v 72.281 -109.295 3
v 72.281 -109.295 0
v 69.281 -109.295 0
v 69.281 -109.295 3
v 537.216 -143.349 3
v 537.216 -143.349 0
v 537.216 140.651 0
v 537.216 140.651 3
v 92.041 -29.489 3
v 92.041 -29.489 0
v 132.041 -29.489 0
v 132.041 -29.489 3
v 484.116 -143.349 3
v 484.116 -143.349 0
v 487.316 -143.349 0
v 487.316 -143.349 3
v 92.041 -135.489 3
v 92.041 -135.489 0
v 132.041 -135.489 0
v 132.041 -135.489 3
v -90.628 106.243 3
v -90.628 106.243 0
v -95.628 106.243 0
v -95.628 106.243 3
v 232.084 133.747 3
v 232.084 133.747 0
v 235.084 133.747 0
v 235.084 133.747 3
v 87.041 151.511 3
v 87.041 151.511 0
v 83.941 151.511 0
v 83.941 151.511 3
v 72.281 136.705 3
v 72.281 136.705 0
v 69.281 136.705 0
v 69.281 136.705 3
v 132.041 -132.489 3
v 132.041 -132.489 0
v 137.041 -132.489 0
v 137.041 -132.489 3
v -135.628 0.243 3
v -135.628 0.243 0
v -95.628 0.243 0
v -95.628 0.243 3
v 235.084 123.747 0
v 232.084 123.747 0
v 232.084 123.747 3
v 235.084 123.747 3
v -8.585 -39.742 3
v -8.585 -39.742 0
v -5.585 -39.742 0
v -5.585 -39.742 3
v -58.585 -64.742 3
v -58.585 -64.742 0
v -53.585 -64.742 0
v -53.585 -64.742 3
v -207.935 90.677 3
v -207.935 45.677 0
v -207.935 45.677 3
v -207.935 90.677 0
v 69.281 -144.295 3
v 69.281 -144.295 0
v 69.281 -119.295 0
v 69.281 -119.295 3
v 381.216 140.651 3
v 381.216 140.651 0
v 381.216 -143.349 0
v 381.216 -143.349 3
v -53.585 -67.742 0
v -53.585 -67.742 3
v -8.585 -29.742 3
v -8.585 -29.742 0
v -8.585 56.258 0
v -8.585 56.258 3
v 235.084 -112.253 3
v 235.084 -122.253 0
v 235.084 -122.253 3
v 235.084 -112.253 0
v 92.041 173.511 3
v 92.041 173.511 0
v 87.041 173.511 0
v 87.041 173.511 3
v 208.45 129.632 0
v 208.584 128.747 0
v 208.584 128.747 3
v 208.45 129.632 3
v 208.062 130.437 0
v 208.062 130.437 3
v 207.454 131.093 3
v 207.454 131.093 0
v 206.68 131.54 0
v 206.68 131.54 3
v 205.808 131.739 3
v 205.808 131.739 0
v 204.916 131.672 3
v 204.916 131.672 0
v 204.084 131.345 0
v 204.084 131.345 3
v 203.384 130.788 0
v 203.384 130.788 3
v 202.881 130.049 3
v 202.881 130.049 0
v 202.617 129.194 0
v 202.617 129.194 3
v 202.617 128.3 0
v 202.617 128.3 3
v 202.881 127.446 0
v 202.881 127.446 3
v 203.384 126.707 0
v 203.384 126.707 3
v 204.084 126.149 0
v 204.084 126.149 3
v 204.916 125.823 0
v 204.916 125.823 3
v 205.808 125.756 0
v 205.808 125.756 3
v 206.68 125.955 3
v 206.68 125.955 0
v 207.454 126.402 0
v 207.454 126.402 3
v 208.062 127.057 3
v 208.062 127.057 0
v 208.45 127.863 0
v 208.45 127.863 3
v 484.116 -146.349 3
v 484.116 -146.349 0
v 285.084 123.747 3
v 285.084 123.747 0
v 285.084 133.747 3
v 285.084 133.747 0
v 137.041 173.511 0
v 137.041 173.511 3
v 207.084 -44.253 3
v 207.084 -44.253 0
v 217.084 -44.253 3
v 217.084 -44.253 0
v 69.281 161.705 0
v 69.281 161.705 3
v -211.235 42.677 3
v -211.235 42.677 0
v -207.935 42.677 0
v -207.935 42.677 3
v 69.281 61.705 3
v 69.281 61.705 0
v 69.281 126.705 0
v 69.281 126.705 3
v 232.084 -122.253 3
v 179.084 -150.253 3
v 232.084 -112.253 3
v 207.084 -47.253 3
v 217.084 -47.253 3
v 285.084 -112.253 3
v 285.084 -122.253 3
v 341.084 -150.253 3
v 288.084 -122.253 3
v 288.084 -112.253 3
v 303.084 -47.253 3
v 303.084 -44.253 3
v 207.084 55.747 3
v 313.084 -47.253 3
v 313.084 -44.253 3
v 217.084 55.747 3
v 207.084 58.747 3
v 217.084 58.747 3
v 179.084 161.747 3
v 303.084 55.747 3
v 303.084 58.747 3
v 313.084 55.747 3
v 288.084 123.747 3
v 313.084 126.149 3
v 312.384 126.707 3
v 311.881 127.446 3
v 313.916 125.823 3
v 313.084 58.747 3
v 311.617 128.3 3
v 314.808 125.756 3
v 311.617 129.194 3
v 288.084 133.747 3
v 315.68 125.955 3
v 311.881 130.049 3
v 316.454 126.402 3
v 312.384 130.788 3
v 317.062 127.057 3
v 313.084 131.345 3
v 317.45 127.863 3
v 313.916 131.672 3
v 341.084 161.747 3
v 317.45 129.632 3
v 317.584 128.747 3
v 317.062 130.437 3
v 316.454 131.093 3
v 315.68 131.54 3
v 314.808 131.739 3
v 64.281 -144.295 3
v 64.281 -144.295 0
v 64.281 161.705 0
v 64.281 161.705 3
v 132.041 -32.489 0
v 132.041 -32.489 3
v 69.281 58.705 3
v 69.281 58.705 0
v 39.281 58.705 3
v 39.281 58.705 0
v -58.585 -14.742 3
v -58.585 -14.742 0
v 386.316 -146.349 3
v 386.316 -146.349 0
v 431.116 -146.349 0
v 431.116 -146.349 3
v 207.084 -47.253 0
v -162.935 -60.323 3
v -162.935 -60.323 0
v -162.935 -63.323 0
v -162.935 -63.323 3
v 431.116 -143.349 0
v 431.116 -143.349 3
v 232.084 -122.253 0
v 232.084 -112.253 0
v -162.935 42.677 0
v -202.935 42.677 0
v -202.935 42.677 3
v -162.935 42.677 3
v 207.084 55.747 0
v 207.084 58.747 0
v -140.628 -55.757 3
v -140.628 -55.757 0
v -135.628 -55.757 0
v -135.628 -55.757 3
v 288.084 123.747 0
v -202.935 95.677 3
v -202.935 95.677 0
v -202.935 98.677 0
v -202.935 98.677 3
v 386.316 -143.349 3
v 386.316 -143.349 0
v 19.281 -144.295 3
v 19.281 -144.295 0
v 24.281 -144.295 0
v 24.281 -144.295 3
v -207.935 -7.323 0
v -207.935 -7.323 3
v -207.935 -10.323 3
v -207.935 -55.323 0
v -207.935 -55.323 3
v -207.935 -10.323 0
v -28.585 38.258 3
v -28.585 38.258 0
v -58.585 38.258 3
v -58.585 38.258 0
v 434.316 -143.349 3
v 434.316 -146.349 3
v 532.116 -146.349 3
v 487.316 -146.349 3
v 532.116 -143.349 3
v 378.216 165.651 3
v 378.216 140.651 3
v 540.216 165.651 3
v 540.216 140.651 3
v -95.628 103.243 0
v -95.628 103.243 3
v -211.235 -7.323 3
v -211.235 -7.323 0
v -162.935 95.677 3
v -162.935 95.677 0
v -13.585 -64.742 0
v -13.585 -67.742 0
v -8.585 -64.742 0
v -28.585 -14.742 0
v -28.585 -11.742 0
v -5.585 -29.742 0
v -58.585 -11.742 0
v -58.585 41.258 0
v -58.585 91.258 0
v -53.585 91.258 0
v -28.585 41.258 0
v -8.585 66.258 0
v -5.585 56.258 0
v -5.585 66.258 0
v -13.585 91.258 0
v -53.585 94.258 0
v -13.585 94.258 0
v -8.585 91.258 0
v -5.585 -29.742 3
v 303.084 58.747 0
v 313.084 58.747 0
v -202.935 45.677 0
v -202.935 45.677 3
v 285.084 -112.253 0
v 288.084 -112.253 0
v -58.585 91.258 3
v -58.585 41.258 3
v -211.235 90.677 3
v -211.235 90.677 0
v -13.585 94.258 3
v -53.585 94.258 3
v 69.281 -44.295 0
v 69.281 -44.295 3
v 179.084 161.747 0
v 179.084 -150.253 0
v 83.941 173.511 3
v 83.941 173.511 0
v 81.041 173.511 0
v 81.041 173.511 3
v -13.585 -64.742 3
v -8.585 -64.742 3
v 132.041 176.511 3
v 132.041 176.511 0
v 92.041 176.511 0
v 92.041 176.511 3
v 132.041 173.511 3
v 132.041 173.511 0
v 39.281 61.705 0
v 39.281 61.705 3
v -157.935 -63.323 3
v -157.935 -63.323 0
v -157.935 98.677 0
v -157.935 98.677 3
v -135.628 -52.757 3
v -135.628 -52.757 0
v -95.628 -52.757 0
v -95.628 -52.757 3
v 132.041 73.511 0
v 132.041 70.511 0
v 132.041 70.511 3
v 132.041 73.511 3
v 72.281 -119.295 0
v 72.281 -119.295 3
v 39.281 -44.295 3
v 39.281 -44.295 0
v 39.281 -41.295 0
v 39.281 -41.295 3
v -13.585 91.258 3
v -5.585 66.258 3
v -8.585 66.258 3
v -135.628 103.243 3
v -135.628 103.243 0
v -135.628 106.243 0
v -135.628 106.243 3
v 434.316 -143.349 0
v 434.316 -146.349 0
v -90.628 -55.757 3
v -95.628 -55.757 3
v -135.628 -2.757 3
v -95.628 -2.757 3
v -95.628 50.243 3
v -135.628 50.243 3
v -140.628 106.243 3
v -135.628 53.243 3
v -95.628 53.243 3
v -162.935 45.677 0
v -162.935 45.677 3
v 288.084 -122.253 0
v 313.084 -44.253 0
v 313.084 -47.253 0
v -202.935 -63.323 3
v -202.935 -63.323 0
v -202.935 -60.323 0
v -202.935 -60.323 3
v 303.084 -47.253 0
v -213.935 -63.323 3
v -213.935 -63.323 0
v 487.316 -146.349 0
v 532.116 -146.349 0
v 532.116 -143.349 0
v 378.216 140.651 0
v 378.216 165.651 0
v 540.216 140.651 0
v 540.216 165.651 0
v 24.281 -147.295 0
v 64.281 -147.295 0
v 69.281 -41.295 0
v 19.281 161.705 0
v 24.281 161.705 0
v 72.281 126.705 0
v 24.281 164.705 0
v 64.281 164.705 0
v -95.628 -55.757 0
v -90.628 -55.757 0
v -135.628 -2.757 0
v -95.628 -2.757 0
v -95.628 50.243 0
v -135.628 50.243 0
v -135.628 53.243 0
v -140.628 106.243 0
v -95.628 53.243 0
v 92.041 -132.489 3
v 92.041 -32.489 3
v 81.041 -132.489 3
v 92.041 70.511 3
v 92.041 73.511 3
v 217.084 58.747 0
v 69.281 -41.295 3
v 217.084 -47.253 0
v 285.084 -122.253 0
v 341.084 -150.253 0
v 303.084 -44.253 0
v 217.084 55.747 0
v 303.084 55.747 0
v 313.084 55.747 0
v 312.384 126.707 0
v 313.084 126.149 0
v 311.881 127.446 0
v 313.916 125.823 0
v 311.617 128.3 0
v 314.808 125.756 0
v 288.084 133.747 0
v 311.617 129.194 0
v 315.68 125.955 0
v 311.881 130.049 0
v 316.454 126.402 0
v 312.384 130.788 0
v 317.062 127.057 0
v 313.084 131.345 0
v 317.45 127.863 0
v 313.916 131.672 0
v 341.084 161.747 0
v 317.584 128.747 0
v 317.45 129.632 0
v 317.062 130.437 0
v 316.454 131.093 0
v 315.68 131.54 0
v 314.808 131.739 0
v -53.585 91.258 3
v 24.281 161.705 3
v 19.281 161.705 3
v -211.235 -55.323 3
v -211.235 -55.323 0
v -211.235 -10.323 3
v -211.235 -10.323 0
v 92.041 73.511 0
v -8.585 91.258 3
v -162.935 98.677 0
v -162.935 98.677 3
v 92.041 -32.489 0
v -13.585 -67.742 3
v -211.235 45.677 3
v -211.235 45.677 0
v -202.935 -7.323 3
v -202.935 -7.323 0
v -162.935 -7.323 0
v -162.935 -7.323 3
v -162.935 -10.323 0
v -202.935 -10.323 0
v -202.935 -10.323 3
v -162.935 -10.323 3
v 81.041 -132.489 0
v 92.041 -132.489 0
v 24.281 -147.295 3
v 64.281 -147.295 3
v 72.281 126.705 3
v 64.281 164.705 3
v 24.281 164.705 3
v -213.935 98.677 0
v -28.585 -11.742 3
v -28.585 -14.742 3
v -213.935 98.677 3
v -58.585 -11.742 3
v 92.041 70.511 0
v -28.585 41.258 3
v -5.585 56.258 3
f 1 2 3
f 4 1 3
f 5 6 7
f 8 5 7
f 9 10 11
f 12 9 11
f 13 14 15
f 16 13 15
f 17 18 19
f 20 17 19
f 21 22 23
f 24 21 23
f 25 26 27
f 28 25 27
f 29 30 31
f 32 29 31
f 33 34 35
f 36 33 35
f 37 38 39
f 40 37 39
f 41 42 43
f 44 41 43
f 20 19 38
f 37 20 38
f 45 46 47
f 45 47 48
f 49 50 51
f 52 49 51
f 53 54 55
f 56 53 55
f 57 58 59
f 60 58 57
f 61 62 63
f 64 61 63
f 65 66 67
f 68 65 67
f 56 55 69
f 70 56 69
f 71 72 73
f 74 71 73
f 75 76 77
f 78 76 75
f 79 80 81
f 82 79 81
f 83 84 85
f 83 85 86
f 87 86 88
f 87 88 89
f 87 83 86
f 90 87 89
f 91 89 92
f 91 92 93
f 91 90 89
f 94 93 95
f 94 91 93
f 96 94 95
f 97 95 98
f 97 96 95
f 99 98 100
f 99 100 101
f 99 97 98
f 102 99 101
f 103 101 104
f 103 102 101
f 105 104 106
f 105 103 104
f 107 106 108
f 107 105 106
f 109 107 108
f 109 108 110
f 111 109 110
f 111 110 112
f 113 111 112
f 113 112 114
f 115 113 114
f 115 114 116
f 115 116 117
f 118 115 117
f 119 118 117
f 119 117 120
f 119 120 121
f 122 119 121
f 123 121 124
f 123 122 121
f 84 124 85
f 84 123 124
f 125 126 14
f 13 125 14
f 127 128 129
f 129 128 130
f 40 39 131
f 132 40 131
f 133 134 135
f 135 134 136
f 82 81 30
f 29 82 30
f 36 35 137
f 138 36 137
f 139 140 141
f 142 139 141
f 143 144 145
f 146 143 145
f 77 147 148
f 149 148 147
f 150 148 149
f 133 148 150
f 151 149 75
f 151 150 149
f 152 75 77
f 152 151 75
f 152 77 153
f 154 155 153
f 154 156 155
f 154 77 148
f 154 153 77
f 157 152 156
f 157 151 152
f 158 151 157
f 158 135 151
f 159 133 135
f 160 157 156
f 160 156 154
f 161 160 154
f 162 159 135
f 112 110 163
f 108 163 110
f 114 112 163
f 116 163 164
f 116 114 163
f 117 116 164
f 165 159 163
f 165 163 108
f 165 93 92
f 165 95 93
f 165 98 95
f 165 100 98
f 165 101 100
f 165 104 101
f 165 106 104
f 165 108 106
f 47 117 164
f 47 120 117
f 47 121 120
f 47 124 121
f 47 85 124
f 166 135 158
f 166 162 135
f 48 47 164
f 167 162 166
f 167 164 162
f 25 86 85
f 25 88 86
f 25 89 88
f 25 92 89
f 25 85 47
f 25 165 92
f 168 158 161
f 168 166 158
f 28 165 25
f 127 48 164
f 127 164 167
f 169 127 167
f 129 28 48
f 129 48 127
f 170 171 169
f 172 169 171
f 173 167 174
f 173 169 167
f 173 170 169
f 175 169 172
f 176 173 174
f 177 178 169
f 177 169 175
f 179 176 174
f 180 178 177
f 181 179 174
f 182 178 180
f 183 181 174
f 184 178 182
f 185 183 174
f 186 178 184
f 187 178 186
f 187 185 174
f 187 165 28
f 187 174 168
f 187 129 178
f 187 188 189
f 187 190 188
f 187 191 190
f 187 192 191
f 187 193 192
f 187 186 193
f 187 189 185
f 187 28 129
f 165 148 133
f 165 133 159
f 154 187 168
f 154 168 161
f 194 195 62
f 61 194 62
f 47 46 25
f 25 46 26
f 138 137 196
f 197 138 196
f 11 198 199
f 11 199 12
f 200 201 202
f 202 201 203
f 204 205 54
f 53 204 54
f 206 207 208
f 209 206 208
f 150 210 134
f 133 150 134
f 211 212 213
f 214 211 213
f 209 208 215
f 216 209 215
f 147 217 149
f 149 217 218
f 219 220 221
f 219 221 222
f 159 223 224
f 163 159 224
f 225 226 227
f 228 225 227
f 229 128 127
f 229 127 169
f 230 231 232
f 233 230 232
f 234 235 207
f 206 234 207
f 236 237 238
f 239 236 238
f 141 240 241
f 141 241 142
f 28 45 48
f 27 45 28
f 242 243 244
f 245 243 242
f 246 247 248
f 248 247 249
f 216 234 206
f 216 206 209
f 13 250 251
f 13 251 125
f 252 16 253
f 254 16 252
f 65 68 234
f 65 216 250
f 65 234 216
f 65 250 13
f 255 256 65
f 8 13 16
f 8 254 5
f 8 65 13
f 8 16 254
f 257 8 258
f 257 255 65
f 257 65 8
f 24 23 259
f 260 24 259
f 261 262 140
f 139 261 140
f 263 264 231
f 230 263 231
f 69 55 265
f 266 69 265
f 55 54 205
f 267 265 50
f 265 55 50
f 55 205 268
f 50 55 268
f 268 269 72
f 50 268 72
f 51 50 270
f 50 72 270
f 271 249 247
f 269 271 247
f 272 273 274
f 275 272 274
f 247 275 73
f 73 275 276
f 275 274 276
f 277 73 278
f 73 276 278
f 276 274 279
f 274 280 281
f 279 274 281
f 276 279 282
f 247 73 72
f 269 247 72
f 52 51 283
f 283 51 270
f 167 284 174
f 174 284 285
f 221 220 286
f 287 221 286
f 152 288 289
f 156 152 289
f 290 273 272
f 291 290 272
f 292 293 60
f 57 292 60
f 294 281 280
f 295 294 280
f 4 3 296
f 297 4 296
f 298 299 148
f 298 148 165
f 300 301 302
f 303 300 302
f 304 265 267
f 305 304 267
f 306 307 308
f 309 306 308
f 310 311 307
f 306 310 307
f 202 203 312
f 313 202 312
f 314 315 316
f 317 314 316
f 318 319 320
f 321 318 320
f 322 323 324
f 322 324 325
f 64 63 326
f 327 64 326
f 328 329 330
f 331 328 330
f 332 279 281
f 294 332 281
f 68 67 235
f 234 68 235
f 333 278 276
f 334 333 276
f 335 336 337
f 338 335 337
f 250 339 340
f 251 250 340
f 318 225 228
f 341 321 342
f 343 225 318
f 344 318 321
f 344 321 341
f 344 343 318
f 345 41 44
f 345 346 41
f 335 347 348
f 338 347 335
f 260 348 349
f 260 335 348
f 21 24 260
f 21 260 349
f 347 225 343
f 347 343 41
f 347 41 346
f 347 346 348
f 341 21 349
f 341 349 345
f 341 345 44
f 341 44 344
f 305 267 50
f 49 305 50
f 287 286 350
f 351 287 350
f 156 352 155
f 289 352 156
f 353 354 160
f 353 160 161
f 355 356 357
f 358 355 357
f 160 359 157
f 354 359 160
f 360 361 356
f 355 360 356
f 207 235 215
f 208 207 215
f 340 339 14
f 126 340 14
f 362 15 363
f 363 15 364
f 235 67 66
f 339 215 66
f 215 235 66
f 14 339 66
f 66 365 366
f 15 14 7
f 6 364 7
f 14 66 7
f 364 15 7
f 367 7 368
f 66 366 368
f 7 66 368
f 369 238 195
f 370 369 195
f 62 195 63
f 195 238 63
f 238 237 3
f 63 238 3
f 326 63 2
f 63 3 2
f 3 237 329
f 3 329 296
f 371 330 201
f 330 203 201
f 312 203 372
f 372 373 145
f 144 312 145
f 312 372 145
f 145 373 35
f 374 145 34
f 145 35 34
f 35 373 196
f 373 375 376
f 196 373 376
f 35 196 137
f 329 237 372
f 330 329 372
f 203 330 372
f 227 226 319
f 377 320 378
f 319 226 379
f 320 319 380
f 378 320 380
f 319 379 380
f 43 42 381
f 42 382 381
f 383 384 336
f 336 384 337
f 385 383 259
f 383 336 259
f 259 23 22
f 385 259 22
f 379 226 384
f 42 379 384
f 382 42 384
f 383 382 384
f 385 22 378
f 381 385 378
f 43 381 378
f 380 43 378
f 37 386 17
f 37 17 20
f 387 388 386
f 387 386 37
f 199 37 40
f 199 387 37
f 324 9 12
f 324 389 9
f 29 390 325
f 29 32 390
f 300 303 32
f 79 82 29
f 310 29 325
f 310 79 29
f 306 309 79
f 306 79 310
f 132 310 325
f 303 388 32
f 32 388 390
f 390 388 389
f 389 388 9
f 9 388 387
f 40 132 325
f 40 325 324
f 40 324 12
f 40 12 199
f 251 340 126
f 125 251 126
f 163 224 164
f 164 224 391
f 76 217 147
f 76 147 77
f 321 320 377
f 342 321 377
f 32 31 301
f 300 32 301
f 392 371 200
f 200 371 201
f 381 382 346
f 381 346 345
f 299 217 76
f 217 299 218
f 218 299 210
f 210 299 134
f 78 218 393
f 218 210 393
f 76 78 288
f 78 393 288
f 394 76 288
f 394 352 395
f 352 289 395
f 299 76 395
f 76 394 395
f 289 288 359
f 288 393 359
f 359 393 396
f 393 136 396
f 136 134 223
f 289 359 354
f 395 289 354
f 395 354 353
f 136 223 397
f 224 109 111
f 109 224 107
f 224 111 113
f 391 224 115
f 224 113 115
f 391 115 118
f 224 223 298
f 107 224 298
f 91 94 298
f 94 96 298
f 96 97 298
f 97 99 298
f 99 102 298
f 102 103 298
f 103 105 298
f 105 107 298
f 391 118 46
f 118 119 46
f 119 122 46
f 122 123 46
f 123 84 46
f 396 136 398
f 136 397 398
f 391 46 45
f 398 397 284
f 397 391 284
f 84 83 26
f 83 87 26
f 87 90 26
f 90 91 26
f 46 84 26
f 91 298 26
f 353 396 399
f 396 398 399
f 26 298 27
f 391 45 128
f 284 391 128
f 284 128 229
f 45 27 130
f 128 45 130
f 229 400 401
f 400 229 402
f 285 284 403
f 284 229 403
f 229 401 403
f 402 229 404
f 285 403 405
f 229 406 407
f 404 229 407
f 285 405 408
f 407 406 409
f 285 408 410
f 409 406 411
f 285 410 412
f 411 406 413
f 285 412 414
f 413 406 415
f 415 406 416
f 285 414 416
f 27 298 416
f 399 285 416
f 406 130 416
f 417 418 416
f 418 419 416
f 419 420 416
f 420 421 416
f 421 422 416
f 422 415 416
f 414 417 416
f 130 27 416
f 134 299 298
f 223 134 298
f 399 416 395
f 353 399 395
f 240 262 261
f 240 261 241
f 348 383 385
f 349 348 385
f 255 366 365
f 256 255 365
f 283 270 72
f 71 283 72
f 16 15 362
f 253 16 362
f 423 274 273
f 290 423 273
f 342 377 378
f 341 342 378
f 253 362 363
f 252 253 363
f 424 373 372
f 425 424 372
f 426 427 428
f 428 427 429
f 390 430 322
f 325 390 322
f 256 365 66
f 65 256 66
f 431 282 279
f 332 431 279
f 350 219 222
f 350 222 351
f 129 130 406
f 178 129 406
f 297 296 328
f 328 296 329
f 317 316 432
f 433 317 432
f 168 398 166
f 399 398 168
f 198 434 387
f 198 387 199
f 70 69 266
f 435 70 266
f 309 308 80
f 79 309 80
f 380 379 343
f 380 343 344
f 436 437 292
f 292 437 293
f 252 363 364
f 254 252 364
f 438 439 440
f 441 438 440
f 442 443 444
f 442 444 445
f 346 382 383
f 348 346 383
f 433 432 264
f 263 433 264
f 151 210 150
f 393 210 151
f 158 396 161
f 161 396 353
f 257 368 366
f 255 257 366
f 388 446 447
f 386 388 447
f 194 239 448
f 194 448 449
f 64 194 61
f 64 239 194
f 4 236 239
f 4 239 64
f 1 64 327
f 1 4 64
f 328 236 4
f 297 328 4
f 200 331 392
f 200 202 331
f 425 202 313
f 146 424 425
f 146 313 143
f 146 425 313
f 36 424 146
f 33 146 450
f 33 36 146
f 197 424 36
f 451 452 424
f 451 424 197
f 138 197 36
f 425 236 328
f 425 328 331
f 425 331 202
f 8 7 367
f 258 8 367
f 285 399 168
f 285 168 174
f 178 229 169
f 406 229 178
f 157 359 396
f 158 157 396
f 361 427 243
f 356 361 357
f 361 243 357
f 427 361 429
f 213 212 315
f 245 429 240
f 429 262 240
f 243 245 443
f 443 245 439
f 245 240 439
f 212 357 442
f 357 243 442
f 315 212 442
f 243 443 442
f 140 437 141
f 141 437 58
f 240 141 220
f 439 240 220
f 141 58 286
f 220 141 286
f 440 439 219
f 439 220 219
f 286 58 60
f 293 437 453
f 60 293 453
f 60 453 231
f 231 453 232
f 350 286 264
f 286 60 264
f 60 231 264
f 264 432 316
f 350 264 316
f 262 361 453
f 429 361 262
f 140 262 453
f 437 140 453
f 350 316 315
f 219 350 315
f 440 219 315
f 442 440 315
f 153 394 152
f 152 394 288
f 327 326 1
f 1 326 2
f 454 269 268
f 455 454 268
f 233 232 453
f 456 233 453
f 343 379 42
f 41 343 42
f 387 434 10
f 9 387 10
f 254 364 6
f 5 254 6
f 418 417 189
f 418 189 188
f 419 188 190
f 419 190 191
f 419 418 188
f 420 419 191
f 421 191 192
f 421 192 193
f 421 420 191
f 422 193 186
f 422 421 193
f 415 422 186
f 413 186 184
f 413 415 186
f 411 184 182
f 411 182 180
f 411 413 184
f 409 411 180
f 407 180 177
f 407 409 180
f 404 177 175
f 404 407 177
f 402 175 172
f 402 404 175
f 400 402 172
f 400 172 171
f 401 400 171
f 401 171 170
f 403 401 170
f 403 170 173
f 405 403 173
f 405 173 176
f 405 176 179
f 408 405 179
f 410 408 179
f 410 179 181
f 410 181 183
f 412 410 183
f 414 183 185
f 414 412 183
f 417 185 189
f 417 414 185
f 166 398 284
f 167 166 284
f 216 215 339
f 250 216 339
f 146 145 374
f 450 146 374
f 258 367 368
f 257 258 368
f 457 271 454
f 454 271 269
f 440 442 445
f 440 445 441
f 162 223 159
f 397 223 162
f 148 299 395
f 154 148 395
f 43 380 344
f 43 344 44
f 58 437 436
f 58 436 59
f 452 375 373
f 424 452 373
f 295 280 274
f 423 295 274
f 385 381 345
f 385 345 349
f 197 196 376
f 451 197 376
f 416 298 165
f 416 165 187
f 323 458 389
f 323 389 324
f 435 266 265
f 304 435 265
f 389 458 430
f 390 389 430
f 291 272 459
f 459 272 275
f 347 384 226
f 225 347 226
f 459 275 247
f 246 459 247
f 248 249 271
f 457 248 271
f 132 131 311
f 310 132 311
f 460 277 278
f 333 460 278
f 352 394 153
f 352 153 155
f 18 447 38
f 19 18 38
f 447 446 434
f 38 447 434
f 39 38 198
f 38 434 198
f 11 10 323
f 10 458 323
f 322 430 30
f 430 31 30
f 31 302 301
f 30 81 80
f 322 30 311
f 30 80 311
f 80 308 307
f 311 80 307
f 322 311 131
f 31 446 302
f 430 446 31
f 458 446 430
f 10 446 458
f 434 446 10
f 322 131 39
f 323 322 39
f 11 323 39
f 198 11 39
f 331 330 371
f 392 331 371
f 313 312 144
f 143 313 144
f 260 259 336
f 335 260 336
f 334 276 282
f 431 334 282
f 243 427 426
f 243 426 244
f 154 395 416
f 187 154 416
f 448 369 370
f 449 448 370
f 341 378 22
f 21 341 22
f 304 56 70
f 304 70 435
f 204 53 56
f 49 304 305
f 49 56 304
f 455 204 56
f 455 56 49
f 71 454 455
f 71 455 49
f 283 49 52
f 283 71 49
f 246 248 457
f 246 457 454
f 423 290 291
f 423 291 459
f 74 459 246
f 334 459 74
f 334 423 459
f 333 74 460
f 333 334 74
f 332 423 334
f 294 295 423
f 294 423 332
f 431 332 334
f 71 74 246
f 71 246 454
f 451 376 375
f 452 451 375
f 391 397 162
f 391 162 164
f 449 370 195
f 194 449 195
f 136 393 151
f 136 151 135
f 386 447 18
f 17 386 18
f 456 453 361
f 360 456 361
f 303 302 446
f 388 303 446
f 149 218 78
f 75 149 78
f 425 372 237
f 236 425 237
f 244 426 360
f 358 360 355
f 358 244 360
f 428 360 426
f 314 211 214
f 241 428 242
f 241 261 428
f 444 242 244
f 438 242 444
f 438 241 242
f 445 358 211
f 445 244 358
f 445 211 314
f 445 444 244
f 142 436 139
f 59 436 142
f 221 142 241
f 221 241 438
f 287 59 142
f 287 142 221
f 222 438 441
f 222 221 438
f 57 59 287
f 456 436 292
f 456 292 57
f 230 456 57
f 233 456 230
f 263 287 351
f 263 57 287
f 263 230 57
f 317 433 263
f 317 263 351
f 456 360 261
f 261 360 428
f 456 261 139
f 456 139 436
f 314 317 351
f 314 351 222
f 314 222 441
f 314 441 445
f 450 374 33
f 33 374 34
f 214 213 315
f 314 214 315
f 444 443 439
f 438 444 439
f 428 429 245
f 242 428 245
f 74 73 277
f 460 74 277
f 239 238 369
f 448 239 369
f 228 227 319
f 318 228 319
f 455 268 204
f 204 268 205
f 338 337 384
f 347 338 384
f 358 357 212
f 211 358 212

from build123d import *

# Parameters (mm, degrees)
F1_DEPTH  = 3
F3_DEPTH  = 3
F4_W      = 40
F4_H      = 3
F5_DEPTH  = 3
F6_W      = 3.3
F6_H      = 45
F6_W_2    = 40
F6_H_2    = 3
F6_H_3    = 50
F7_DEPTH  = 3
F8_W      = 40
F8_H      = 3
F9_DEPTH  = 3
F10_W     = 162
F10_H     = 312
F10_W_2   = 3
F10_H_2   = 10
F10_W_3   = 10
F10_H_3   = 3
F10_R     = 3
F11_DEPTH = 3
F13_DEPTH = 3


with BuildPart() as f1:
    # F0 (on Top) → F1 (new body)
    with BuildSketch(Plane.XY):
        Polygon((-13.584544, 94.258389), (-53.584544, 94.258389), (-53.584544, 91.258389), (-58.584544, 91.258389), (-58.584544, 41.258389), (-28.584544, 41.258389), (-28.584544, 38.258389), (-58.584544, 38.258389), (-58.584544, -11.741611), (-28.584544, -11.741611), (-28.584544, -14.741611), (-58.584544, -14.741611), (-58.584544, -64.741611), (-53.584544, -64.741611), (-53.584544, -67.741611), (-13.584544, -67.741611), (-13.584544, -64.741611), (-8.584544, -64.741611), (-8.584544, -39.741611), (-5.584544, -39.741611), (-5.584544, -29.741611), (-8.584544, -29.741611), (-8.584544, 56.258389), (-5.584544, 56.258389), (-5.584544, 66.258389), (-8.584544, 66.258389), (-8.584544, 91.258389), (-13.584544, 91.258389), align=None)
    extrude(amount=F1_DEPTH)


with BuildPart() as f3:
    # F2 (on Top) → F3 (new body)
    with BuildSketch(Plane.XY):
        Polygon((64.28074, 164.704534), (24.28074, 164.704534), (24.28074, 161.704534), (19.28074, 161.704534), (19.28074, -144.295466), (24.28074, -144.295466), (24.28074, -147.295466), (64.28074, -147.295466), (64.28074, -144.295466), (69.28074, -144.295466), (69.28074, -119.295466), (72.28074, -119.295466), (72.28074, -109.295466), (69.28074, -109.295466), (69.28074, -44.295466), (39.28074, -44.295466), (39.28074, -41.295466), (69.28074, -41.295466), (69.28074, 58.704534), (39.28074, 58.704534), (39.28074, 61.704534), (69.28074, 61.704534), (69.28074, 126.704534), (72.28074, 126.704534), (72.28074, 136.704534), (69.28074, 136.704534), (69.28074, 161.704534), (64.28074, 161.704534), align=None)
    extrude(amount=F3_DEPTH)


with BuildPart() as f5:
    # F4 (on Top) → F5 (new body)
    with BuildSketch(Plane.XY):
        Polygon((-135.627807, 106.242693), (-140.627807, 106.242693), (-140.627807, -55.757307), (-135.627807, -55.757307), (-135.627807, -52.757307), (-95.627807, -52.757307), (-95.627807, -55.757307), (-90.627807, -55.757307), (-90.627807, 106.242693), (-95.627807, 106.242693), (-95.627807, 103.242693), (-135.627807, 103.242693), align=None)
        with Locations((-115.627807, -1.257307)):
            Rectangle(F4_W, F4_H, mode=Mode.SUBTRACT)
        with Locations((-115.627807, 51.742693)):
            Rectangle(F4_W, F4_H, mode=Mode.SUBTRACT)
    extrude(amount=F5_DEPTH)


with BuildPart() as f7:
    # F6 (on Top) → F7 (new body)
    with BuildSketch(Plane.XY):
        Polygon((-202.935444, 98.677179), (-213.935444, 98.677179), (-213.935444, -63.322821), (-202.935444, -63.322821), (-202.935444, -60.322821), (-162.935444, -60.322821), (-162.935444, -63.322821), (-157.935444, -63.322821), (-157.935444, 98.677179), (-162.935444, 98.677179), (-162.935444, 95.677179), (-202.935444, 95.677179), align=None)
        with Locations((-209.585444, -32.822821)):
            Rectangle(F6_W, F6_H, mode=Mode.SUBTRACT)
        with Locations((-182.935444, -8.822821)):
            Rectangle(F6_W_2, F6_H_2, mode=Mode.SUBTRACT)
        with Locations((-209.585444, 17.677179)):
            Rectangle(F6_W, F6_H_3, mode=Mode.SUBTRACT)
        with Locations((-209.585444, 68.177179)):
            Rectangle(F6_W, F6_H, mode=Mode.SUBTRACT)
        with Locations((-182.935444, 44.177179)):
            Rectangle(F6_W_2, F6_H_2, mode=Mode.SUBTRACT)
    extrude(amount=F7_DEPTH)


with BuildPart() as f9:
    # F8 (on Top) → F9 (new body)
    with BuildSketch(Plane.XY):
        Polygon((132.040561, 176.510739), (92.040561, 176.510739), (92.040561, 173.510739), (87.040561, 173.510739), (87.040561, 151.510739), (83.940561, 151.510739), (83.940561, 173.510739), (81.040561, 173.510739), (81.040561, -132.489261), (92.040561, -132.489261), (92.040561, -135.489261), (132.040561, -135.489261), (132.040561, -132.489261), (137.040561, -132.489261), (137.040561, 173.510739), (132.040561, 173.510739), align=None)
        with Locations((112.040561, -30.989261)):
            Rectangle(F8_W, F8_H, mode=Mode.SUBTRACT)
        with Locations((112.040561, 72.010739)):
            Rectangle(F8_W, F8_H, mode=Mode.SUBTRACT)
    extrude(amount=F9_DEPTH)


with BuildPart() as f11:
    # F10 (on Top) → F11 (new body)
    with BuildSketch(Plane.XY):
        with Locations((260.083628, 5.747356)):
            Rectangle(F10_W, F10_H)
        with Locations((233.583628, -117.252644)):
            Rectangle(F10_W_2, F10_H_2, mode=Mode.SUBTRACT)
        with Locations((212.083628, -45.752644)):
            Rectangle(F10_W_3, F10_H_3, mode=Mode.SUBTRACT)
        with Locations((286.583628, -117.252644)):
            Rectangle(F10_W_2, F10_H_2, mode=Mode.SUBTRACT)
        with Locations((308.083628, -45.752644)):
            Rectangle(F10_W_3, F10_H_3, mode=Mode.SUBTRACT)
        with Locations((212.083628, 57.247356)):
            Rectangle(F10_W_3, F10_H_3, mode=Mode.SUBTRACT)
        with Locations((205.583628, 128.747356)):
            Circle(F10_R, mode=Mode.SUBTRACT)
        with Locations((233.583628, 128.747356)):
            Rectangle(F10_W_2, F10_H_2, mode=Mode.SUBTRACT)
        with Locations((308.083628, 57.247356)):
            Rectangle(F10_W_3, F10_H_3, mode=Mode.SUBTRACT)
        with Locations((286.583628, 128.747356)):
            Rectangle(F10_W_2, F10_H_2, mode=Mode.SUBTRACT)
        with Locations((314.583628, 128.747356)):
            Circle(F10_R, mode=Mode.SUBTRACT)
    extrude(amount=F11_DEPTH)


with BuildPart() as f13:
    # F12 (on Top) → F13 (new body)
    with BuildSketch(Plane.XY):
        Polygon((540.216496, 165.651241), (378.216496, 165.651241), (378.216496, 140.651241), (381.216496, 140.651241), (381.216496, -143.348759), (386.316496, -143.348759), (386.316496, -146.348759), (431.116496, -146.348759), (431.116496, -143.348759), (434.316496, -143.348759), (434.316496, -146.348759), (484.116496, -146.348759), (484.116496, -143.348759), (487.316496, -143.348759), (487.316496, -146.348759), (532.116496, -146.348759), (532.116496, -143.348759), (537.216496, -143.348759), (537.216496, 140.651241), (540.216496, 140.651241), align=None)
    extrude(amount=F13_DEPTH)


solid = Compound([f1.part, f3.part, f5.part, f7.part, f9.part, f11.part, f13.part])
